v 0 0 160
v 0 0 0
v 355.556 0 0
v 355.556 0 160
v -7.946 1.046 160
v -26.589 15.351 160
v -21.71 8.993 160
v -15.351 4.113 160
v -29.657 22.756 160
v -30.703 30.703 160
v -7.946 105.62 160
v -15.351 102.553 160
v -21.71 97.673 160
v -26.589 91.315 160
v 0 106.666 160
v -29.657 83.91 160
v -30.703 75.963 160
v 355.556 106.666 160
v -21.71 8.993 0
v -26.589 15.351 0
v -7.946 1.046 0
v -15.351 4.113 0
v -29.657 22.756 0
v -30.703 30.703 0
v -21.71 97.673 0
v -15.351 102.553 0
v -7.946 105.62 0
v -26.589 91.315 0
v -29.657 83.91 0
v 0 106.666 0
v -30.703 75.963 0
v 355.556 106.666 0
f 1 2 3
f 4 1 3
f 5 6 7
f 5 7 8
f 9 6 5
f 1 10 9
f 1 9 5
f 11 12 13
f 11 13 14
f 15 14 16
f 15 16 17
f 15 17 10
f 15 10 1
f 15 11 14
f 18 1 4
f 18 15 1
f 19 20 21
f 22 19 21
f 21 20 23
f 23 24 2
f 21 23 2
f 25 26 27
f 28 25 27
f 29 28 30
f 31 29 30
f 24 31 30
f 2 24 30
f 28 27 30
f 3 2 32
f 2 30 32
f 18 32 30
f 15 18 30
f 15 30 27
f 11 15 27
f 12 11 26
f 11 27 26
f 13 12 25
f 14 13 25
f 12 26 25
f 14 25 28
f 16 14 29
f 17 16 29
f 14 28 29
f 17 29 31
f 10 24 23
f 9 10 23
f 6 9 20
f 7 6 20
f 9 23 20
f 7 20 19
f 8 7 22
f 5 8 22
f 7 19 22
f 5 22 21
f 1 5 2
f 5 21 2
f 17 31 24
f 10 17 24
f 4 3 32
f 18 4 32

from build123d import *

# Parameters (mm, degrees)
AUFSATZ_LINEAR_AUSTRAGEN1_DEPTH = 160


with BuildPart() as part:
    # Skizze1 → Aufsatz-Linear austragen1 (new body)
    with BuildSketch(Plane.XY):
        with BuildLine():
            Line((0, 0), (355.55555, 0))
            Line((355.55555, 0), (355.55555, 106.666))
            Line((355.55555, 106.666), (0, 106.666))
            ThreePointArc((0, 106.666), (-21.710167252, 97.673354283), (-30.702812969, 75.963187031))
            Line((-30.702812969, 75.963187031), (-30.702812969, 30.702812969))
            ThreePointArc((-30.702812969, 30.702812969), (-21.710167252, 8.992645717), (0, 0))
        make_face()
    extrude(amount=AUFSATZ_LINEAR_AUSTRAGEN1_DEPTH)


solid = part.part
